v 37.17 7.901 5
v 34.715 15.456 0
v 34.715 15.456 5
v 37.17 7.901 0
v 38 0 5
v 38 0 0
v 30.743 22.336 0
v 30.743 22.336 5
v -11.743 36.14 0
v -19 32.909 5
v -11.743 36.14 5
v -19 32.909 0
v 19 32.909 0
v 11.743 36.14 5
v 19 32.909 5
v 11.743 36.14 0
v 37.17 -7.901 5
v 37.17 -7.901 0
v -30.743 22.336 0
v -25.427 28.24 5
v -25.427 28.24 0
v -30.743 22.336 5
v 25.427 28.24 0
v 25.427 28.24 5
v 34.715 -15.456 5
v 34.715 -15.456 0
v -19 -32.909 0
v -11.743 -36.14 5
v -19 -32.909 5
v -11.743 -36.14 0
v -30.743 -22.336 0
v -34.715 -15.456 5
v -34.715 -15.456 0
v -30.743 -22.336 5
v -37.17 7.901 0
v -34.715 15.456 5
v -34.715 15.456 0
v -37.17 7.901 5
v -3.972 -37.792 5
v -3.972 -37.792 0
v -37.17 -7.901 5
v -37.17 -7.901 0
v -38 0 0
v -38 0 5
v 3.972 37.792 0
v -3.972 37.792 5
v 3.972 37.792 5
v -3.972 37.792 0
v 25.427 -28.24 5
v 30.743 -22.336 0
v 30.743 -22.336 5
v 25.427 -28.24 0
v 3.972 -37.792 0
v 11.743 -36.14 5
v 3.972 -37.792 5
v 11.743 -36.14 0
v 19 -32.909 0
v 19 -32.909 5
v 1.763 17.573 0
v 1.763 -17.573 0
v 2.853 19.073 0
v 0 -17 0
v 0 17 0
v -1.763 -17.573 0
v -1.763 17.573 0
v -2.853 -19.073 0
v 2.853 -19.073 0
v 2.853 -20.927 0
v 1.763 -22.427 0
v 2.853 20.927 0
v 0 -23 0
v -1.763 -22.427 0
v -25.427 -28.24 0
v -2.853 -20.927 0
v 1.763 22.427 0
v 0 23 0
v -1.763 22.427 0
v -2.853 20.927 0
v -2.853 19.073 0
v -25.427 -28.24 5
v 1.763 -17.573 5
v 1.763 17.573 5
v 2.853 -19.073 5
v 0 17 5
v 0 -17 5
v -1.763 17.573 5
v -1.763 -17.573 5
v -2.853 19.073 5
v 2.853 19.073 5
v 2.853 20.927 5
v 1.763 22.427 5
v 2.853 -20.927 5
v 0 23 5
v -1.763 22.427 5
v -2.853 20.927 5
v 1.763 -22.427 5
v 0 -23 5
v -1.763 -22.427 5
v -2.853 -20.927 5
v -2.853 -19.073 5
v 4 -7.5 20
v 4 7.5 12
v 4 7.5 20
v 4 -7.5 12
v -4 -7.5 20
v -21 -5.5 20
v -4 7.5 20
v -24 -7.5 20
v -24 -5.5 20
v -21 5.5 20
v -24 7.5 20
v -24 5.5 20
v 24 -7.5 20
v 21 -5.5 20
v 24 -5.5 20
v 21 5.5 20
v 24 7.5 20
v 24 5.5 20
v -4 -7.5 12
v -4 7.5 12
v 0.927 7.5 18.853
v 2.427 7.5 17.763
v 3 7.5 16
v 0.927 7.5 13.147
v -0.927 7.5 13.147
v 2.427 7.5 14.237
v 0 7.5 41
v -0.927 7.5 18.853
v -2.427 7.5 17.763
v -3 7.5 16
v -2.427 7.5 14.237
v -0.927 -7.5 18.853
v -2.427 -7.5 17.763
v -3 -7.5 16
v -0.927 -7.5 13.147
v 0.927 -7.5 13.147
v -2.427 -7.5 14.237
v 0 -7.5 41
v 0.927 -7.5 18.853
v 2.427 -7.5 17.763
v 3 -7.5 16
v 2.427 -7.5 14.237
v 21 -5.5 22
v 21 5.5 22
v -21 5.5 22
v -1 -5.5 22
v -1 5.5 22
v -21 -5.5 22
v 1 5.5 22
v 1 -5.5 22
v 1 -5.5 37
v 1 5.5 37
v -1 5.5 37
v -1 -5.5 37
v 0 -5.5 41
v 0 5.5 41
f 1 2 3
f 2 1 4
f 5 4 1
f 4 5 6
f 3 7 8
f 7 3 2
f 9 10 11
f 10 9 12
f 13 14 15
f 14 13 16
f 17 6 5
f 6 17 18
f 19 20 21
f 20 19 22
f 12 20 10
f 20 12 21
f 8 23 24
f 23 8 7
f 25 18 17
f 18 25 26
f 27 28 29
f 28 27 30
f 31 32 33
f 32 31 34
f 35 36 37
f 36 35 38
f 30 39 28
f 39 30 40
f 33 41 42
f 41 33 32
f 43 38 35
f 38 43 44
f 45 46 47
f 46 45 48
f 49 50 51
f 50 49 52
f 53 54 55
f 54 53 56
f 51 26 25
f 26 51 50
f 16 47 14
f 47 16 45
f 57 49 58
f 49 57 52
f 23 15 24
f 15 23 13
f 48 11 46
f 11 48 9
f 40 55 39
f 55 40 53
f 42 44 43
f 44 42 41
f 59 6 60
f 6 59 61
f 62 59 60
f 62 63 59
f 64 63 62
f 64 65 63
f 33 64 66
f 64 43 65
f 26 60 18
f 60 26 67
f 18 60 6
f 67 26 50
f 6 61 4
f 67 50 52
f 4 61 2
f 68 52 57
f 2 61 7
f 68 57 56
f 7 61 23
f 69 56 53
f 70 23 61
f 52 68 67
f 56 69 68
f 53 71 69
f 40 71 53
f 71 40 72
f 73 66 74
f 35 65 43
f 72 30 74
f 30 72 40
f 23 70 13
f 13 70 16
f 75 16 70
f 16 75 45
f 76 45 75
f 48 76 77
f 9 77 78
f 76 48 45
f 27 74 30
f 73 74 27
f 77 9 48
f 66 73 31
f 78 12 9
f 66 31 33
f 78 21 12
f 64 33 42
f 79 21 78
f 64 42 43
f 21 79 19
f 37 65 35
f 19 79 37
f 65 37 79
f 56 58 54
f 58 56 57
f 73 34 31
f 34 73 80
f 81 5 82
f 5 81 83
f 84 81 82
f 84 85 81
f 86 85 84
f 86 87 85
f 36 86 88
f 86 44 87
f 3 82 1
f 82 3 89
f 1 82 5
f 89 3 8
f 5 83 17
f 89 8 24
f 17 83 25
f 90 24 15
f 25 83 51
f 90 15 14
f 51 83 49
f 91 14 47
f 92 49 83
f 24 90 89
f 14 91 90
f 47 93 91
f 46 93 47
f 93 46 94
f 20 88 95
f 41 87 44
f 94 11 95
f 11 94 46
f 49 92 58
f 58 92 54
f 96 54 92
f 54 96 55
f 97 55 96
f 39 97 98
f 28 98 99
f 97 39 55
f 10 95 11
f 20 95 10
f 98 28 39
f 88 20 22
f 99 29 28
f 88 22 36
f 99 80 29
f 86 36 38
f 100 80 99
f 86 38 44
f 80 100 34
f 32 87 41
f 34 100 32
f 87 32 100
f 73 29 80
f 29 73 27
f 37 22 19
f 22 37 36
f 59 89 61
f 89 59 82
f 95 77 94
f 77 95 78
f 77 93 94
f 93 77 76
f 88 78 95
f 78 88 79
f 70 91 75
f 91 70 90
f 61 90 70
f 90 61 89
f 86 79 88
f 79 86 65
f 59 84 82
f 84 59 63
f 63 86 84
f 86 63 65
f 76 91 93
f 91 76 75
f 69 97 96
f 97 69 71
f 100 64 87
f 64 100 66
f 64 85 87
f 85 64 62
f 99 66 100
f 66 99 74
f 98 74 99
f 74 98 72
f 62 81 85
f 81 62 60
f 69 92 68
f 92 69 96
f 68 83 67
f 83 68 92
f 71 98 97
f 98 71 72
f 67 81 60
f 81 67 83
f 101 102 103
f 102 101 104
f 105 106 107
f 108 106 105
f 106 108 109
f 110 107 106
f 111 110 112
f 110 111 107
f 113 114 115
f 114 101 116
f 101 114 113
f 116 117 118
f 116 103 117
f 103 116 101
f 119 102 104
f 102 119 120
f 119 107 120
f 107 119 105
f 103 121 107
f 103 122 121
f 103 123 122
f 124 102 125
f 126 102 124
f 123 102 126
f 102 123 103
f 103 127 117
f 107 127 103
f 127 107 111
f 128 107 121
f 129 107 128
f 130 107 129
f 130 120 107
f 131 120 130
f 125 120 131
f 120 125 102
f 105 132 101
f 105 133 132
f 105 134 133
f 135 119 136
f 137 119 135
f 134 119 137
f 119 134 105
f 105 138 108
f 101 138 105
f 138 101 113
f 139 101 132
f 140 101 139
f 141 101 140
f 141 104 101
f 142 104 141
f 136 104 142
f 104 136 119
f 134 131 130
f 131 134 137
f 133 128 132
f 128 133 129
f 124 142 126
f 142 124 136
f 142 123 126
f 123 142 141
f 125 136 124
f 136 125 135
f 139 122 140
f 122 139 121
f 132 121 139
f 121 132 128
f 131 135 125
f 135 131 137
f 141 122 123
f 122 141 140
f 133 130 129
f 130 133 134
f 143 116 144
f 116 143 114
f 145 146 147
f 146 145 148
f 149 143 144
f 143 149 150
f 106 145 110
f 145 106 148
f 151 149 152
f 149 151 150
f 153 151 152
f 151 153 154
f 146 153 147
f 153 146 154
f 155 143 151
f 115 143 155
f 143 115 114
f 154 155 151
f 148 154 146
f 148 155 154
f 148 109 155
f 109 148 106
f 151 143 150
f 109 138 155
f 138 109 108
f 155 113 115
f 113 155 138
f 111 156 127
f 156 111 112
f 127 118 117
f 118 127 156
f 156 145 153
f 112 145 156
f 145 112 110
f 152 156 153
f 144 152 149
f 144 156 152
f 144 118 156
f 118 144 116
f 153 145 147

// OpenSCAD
// All units are in millimeters
width = 40; // Total diameter
height = 20; // Height of a single ring
stick_width = 6; // M6 = 6mm
margin = 1; // Wall thickness

count = 3; // Ring count
offset = width/2; // Mounting hole offset
bottom_height = height/4; // Bottom plate height

// cylinder(h=height,r1=diameter/2,r2=diameter/2);

module bottom_plate(height) {
    difference() {
        cylinder(h=height,r1=width-margin*2,r2=width-margin*2);

        rotate([0, 0, 90])
        translate([offset, 0, 0]) 
            cylinder(h=height,r1=stick_width/2,r2=stick_width/2);
        rotate([0, 0, 90])
        translate([-offset, 0, 0]) 
            cylinder(h=height,r1=stick_width/2,r2=stick_width/2);
    }
}

module stick(height=1) {
    difference () {
        cylinder(h=height,r1=width,r2=width);
        cylinder(h=height,r1=width/2,r2=width/2);
    };
}

bottom_plate(5);

module Arrow(length, width, angle, height=10, heights=undef, center=undef, centerXYZ=[true, false, false]) {
    //Calcluate the angle
    triangleAngle = (angle!=undef) ? angle : atan(length / (width/2));
	
    //Calcute the length
    triangleLength = (width==undef) ? (length/sin((180-(angle*2))/2)) : (width / cos(triangleAngle))/2;
	
    //Calculate the width
    triangleWidth = (width==undef) ? (cos(angle)*triangleLength)*2:width;
    
	// Calculate Heights at each point
	heightAB = ((heights==undef) ? height : heights[0])/2;
	heightBC = ((heights==undef) ? height : heights[1])/2;
	heightCA = ((heights==undef) ? height : heights[2])/2;
	centerZ = (center || (center==undef && centerXYZ[2])) ? 0 : max(heightAB, heightBC, heightCA);

	// Calculate Offsets for centering
	offsetX = (center || (center==undef && centerXYZ[0])) ? ((cos(triangleAngle) * triangleLength) + triangleWidth) / 3:0;
	offsetY = (center || (center==undef && centerXYZ[1])) ? (sin(triangleAngle) * triangleLength) / 3:0;	
    
    //Calculate the points
	pointAB1 = [-offsetX, -offsetY, centerZ - heightAB];
	pointAB2 = [-offsetX, -offsetY, centerZ + heightAB];
	pointBC1 = [triangleWidth - offsetX, -offsetY, centerZ - heightBC];
	pointBC2 = [triangleWidth - offsetX, -offsetY, centerZ + heightBC];
	pointCA1 = [(cos(triangleAngle) * triangleLength) - offsetX,(sin(triangleAngle) * triangleLength) - offsetY, centerZ - heightCA];
	pointCA2 = [(cos(triangleAngle) * triangleLength) - offsetX,(sin(triangleAngle) * triangleLength) - offsetY, centerZ + heightCA];

    //Set the triangle points
    trianglePoints = [
        pointAB1, 
        pointBC1, 
        pointCA1,
        pointAB2, 
        pointBC2, 
        pointCA2
    ];
    
    //Set the triangle faces
    triangleFaces = [
        [0, 1, 2],
        [3, 5, 4],
        [0, 3, 1],
        [1, 3, 4],
        [1, 4, 2],
        [2, 4, 5],
        [2, 5, 0],
        [0, 5, 3]
    ];
	polyhedron(trianglePoints, triangleFaces);
}

module wipwap(width=42, height=15, depth=10, wall=2) {
    union() {
        cube([width, height, wall]);
        translate([width/2-wall/2, 0, wall])
            cube([wall, height, height]);
        translate([width/2-(stick_width+wall)/2, 0, -stick_width-wall]) difference() {
            cube([stick_width+wall, height, stick_width+wall]);
            rotate([270, 0, 0]) 
            translate([(stick_width+wall)/2, -(stick_width+wall)/2, 0])
                cylinder(h=height*99, r1=stick_width/2, r2=stick_width/2);
        }
        
        translate([width/2, wall, 0])
        rotate([90, 0, 0])
            Arrow(width = width+wall*3, length = height+wall*3, height=wall);
        
        translate([width/2, height, 0])
        rotate([90, 0, 0])
            Arrow(width = width+wall*3, length = height+wall*3, height=wall);
    }
}


translate([-42/2, -15/2, 20])
    wipwap();
